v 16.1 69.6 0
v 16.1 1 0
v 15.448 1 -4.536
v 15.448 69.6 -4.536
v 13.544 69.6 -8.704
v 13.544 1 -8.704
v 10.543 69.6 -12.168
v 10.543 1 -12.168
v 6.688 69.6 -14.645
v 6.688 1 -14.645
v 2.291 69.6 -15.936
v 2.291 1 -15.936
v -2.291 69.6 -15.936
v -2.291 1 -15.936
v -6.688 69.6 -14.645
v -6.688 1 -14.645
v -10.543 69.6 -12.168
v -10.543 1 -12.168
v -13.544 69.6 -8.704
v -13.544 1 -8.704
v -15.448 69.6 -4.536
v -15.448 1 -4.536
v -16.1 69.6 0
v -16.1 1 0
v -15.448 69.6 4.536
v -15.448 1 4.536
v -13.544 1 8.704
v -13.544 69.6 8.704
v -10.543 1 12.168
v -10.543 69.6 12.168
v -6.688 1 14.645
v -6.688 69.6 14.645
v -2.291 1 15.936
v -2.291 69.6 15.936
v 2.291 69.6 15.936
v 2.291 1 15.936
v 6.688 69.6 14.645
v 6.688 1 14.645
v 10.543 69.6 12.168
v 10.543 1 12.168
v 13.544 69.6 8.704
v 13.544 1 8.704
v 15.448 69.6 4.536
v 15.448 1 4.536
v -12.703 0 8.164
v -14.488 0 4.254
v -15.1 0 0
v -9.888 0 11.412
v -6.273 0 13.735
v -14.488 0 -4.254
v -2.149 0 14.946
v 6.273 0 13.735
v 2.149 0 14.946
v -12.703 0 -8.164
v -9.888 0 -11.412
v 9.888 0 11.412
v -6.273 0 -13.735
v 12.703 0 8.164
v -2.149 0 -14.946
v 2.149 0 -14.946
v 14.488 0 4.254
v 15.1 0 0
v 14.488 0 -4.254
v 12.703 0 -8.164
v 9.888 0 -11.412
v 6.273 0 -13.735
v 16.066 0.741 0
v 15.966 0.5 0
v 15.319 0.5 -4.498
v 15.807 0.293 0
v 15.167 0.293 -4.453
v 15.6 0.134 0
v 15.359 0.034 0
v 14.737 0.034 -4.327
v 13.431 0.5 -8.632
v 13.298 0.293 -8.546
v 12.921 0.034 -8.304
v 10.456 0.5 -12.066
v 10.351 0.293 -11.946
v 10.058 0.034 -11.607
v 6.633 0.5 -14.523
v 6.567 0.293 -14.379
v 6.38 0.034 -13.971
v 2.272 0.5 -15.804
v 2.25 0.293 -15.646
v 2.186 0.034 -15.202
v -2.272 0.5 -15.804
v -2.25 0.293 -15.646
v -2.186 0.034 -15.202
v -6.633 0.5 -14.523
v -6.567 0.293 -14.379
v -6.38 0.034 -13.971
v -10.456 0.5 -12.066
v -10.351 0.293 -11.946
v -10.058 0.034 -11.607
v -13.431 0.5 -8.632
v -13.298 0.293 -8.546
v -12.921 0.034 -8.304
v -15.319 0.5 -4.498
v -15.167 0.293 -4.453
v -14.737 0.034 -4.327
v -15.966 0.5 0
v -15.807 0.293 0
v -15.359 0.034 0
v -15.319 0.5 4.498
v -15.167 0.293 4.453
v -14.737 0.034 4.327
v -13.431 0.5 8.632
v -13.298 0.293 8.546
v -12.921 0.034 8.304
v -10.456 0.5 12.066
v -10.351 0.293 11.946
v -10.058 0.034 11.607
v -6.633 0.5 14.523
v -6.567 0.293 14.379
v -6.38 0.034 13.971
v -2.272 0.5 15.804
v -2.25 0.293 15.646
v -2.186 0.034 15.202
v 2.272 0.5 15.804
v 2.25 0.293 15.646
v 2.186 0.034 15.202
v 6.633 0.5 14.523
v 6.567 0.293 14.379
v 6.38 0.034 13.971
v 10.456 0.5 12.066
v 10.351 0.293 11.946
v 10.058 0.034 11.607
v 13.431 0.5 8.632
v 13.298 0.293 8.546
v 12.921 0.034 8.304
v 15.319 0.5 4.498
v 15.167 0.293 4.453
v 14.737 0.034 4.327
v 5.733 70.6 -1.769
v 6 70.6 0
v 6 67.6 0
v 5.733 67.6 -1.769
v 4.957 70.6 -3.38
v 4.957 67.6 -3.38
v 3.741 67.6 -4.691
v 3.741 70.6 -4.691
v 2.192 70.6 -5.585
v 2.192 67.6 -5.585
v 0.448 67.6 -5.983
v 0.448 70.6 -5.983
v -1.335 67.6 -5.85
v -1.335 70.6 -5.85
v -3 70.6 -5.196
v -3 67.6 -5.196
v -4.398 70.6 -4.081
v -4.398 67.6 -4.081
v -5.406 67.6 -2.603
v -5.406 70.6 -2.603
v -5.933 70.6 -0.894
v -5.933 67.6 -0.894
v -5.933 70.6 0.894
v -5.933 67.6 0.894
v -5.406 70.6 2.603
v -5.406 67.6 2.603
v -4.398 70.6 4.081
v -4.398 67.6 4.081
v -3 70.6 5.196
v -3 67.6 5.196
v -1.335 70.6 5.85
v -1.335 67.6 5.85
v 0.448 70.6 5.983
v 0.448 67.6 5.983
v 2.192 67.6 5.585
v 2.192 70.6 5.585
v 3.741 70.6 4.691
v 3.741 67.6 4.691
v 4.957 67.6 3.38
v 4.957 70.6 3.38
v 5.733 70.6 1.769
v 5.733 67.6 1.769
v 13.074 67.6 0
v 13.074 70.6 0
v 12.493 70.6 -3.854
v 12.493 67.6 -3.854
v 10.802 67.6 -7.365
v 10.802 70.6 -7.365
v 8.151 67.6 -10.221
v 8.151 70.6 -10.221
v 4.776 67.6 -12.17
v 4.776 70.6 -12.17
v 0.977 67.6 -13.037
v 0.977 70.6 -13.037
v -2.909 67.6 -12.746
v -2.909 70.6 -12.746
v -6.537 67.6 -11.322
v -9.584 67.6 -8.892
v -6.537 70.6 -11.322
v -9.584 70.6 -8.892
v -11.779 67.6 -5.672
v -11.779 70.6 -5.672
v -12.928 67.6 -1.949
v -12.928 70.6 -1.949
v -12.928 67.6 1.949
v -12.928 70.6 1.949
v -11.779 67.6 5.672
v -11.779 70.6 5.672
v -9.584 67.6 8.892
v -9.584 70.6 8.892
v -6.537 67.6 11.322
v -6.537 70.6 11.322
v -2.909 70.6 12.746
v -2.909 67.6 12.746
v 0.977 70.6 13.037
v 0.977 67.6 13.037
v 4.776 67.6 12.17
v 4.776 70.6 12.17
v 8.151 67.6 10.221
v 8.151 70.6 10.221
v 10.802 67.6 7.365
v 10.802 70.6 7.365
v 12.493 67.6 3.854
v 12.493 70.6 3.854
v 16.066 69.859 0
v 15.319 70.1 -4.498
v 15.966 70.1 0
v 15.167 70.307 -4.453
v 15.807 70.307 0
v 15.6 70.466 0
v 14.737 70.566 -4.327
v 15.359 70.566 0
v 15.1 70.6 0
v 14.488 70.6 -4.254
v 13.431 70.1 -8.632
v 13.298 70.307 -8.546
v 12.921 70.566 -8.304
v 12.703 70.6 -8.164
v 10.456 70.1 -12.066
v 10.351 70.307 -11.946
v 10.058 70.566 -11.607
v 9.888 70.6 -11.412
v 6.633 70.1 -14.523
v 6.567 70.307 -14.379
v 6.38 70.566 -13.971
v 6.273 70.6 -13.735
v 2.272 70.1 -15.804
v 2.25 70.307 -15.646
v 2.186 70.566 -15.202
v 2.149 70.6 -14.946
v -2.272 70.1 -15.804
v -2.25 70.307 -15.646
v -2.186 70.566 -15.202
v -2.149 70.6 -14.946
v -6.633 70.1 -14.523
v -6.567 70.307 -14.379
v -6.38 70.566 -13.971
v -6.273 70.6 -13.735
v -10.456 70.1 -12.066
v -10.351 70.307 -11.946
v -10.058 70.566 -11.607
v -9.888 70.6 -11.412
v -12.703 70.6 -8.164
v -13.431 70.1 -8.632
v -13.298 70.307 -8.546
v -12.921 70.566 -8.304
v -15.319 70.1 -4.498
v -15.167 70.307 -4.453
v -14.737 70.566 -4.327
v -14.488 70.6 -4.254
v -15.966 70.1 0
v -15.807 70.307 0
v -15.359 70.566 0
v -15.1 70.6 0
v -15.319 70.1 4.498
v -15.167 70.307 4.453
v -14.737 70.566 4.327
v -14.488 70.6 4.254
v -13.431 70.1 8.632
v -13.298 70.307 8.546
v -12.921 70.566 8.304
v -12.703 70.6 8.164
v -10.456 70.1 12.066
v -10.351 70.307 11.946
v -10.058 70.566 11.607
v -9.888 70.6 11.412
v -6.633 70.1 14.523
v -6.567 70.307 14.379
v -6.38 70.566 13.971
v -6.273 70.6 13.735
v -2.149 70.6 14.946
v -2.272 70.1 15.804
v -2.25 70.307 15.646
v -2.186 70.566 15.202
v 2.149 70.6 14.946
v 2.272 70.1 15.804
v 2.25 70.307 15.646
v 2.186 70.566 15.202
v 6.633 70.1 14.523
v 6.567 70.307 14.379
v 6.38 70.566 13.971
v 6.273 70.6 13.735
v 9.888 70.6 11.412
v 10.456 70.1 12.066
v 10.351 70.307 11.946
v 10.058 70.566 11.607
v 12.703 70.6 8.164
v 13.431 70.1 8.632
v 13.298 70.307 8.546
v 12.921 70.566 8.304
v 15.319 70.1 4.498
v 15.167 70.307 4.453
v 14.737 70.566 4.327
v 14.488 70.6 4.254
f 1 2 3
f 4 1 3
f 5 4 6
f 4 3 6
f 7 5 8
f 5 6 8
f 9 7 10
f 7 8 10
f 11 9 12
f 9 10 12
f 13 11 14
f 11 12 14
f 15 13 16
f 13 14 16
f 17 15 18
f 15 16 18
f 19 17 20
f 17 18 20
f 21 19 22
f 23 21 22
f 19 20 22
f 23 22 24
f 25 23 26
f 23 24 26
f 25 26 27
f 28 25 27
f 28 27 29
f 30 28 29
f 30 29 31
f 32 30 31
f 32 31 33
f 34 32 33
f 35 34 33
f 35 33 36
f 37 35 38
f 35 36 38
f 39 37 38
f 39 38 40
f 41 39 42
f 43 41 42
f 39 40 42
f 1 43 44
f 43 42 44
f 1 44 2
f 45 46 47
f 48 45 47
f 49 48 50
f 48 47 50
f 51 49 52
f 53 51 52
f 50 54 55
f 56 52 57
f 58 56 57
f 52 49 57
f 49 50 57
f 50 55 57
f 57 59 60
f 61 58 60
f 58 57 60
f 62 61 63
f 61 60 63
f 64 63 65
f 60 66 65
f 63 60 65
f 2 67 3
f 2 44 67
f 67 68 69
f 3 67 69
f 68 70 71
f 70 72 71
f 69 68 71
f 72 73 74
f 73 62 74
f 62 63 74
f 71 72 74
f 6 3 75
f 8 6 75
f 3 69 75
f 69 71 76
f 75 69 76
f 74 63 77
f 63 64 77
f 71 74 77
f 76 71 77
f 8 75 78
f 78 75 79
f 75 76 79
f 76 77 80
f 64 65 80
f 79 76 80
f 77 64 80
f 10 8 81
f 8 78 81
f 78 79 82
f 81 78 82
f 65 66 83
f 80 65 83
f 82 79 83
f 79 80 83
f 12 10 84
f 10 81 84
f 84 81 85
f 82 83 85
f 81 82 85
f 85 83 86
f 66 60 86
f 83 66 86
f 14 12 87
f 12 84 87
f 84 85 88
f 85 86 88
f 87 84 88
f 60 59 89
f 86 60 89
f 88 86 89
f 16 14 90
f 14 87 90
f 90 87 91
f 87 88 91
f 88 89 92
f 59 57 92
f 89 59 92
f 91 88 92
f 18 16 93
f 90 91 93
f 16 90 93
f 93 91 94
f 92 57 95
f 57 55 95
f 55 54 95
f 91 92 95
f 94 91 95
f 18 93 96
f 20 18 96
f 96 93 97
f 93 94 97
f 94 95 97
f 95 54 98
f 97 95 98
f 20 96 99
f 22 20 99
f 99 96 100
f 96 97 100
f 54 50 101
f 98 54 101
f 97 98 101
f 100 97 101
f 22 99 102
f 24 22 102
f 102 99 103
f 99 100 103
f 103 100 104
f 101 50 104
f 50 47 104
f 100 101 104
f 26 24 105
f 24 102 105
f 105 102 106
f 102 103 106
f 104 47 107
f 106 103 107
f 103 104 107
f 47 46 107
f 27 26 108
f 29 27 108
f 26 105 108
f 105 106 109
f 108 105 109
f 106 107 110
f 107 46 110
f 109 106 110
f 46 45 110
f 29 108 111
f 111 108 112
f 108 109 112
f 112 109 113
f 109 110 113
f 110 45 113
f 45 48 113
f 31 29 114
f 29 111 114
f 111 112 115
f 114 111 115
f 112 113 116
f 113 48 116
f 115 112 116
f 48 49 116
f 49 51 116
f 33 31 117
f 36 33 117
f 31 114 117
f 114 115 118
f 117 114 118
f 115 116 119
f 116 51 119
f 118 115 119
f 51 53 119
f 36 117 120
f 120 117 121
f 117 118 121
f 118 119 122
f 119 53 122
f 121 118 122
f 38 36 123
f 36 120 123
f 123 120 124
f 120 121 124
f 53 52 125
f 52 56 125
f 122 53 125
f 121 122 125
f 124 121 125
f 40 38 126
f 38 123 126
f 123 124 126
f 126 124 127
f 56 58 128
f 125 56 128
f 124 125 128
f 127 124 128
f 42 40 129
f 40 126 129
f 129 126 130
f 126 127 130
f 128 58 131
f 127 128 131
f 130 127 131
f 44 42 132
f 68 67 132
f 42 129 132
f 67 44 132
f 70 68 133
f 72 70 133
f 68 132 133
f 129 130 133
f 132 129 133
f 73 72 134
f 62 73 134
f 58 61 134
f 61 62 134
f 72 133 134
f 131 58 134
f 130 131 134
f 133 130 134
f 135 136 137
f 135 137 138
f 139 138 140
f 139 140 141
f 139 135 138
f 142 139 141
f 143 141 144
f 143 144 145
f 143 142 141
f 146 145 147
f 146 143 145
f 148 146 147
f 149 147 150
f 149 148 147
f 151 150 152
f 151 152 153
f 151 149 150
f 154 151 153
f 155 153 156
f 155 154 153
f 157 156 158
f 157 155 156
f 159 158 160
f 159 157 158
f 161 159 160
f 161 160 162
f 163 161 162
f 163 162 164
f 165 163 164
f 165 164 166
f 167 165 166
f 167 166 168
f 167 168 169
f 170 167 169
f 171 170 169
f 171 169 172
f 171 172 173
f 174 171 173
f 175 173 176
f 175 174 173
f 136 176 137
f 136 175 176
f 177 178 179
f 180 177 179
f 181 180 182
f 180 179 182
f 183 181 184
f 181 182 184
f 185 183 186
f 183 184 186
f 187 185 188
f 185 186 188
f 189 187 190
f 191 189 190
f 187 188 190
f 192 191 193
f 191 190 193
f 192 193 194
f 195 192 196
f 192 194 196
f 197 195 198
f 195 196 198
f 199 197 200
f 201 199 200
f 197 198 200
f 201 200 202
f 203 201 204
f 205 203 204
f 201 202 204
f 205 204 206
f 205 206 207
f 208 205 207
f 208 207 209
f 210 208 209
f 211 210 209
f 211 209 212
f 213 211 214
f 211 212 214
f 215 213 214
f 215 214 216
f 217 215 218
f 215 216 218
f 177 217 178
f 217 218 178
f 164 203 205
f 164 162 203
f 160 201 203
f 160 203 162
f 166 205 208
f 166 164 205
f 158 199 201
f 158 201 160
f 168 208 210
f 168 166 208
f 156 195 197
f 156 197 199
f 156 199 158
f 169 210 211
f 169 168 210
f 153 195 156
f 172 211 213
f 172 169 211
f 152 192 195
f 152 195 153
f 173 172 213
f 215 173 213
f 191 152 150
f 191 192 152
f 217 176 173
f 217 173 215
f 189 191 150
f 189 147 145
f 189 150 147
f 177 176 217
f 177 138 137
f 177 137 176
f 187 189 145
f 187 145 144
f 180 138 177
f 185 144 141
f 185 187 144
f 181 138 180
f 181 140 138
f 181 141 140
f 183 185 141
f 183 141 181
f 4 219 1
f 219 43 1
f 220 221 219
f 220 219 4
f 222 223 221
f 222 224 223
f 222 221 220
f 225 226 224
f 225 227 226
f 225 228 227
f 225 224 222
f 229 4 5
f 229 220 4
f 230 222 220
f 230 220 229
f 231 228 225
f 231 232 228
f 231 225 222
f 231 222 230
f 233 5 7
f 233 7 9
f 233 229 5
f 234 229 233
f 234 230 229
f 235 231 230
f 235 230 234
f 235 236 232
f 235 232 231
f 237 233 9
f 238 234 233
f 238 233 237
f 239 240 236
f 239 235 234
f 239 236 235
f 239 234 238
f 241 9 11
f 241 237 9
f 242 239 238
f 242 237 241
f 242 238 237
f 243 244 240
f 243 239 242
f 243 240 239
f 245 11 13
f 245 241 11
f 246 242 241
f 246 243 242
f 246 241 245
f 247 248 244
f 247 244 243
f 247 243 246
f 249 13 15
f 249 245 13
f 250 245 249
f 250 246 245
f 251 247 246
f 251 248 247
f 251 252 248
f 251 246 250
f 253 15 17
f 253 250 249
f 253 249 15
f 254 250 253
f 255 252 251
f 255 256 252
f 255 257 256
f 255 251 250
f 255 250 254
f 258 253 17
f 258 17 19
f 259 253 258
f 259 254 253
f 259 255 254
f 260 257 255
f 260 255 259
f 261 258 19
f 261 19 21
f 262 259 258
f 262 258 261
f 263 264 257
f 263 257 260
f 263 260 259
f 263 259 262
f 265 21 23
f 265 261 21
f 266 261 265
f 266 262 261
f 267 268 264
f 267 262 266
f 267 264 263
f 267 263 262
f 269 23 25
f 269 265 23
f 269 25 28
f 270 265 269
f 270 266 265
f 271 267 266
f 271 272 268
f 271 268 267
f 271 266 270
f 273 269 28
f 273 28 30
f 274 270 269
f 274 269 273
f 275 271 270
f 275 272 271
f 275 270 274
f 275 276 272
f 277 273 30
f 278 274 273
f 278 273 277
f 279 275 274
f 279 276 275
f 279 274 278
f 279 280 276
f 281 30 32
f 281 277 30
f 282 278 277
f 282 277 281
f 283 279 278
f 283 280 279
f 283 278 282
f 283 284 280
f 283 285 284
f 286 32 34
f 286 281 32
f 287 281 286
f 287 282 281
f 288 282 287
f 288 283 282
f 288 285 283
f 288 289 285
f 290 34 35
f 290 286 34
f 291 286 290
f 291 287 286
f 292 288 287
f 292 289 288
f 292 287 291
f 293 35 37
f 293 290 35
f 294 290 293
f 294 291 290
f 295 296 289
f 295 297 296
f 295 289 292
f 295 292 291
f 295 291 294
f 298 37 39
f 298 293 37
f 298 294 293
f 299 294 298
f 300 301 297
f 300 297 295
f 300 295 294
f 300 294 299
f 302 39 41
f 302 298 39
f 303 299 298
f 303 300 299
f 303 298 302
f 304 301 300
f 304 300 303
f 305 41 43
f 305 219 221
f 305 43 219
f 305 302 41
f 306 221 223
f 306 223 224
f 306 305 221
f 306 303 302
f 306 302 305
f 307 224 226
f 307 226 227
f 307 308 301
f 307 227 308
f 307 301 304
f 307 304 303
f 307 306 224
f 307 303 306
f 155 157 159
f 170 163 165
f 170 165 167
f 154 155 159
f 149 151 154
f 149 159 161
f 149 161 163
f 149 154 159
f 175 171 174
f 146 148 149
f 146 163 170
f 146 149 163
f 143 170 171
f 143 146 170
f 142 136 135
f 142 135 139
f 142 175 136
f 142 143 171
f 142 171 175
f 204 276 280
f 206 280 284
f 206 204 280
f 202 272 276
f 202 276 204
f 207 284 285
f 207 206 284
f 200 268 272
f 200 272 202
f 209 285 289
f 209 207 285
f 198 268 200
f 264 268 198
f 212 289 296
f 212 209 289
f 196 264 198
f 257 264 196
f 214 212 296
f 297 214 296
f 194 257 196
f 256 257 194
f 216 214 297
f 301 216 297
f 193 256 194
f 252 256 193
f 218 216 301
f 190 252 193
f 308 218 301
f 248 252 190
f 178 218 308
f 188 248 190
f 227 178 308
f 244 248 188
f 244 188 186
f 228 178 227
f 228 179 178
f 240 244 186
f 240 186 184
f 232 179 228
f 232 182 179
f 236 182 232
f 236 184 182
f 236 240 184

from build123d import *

# Parameters (mm, degrees)
SKETCH_1_R          = 16.1
EXTRUDE_1_DEPTH     = 70.6
SKETCH_3_R          = 13.073776485
SKETCH_3_R_2        = 6
CUT_EXTRUDE_1_DEPTH = 3
FILLET_1_R          = 1
FILLET_2_R          = 1


with BuildPart() as part:
    # 草图1 → 凸台-拉伸1 (new body)
    with BuildSketch(Plane(origin=(0, 0, 0), x_dir=(1, 0, 0), z_dir=(0, 1, 0))):
        Circle(SKETCH_1_R)
    extrude(amount=EXTRUDE_1_DEPTH)

    # 草图3 → 切除-拉伸1 (cut)
    with BuildSketch(Plane(origin=(0, 70.6, 0), x_dir=(1, 0, 0), z_dir=(0, 1, 0))):
        Circle(SKETCH_3_R)
        Circle(SKETCH_3_R_2, mode=Mode.SUBTRACT)
    extrude(amount=-CUT_EXTRUDE_1_DEPTH, mode=Mode.SUBTRACT)

    # 圆角1
    fillet_1_edges = [part.edges().sort_by_distance(p)[0] for p in [
        (-16.1, 0, 0),
    ]]
    fillet(fillet_1_edges, radius=FILLET_1_R)

    # 圆角2
    fillet_2_edges = [part.edges().sort_by_distance(p)[0] for p in [
        (-16.1, 70.6, 0),
    ]]
    fillet(fillet_2_edges, radius=FILLET_2_R)


solid = part.part
